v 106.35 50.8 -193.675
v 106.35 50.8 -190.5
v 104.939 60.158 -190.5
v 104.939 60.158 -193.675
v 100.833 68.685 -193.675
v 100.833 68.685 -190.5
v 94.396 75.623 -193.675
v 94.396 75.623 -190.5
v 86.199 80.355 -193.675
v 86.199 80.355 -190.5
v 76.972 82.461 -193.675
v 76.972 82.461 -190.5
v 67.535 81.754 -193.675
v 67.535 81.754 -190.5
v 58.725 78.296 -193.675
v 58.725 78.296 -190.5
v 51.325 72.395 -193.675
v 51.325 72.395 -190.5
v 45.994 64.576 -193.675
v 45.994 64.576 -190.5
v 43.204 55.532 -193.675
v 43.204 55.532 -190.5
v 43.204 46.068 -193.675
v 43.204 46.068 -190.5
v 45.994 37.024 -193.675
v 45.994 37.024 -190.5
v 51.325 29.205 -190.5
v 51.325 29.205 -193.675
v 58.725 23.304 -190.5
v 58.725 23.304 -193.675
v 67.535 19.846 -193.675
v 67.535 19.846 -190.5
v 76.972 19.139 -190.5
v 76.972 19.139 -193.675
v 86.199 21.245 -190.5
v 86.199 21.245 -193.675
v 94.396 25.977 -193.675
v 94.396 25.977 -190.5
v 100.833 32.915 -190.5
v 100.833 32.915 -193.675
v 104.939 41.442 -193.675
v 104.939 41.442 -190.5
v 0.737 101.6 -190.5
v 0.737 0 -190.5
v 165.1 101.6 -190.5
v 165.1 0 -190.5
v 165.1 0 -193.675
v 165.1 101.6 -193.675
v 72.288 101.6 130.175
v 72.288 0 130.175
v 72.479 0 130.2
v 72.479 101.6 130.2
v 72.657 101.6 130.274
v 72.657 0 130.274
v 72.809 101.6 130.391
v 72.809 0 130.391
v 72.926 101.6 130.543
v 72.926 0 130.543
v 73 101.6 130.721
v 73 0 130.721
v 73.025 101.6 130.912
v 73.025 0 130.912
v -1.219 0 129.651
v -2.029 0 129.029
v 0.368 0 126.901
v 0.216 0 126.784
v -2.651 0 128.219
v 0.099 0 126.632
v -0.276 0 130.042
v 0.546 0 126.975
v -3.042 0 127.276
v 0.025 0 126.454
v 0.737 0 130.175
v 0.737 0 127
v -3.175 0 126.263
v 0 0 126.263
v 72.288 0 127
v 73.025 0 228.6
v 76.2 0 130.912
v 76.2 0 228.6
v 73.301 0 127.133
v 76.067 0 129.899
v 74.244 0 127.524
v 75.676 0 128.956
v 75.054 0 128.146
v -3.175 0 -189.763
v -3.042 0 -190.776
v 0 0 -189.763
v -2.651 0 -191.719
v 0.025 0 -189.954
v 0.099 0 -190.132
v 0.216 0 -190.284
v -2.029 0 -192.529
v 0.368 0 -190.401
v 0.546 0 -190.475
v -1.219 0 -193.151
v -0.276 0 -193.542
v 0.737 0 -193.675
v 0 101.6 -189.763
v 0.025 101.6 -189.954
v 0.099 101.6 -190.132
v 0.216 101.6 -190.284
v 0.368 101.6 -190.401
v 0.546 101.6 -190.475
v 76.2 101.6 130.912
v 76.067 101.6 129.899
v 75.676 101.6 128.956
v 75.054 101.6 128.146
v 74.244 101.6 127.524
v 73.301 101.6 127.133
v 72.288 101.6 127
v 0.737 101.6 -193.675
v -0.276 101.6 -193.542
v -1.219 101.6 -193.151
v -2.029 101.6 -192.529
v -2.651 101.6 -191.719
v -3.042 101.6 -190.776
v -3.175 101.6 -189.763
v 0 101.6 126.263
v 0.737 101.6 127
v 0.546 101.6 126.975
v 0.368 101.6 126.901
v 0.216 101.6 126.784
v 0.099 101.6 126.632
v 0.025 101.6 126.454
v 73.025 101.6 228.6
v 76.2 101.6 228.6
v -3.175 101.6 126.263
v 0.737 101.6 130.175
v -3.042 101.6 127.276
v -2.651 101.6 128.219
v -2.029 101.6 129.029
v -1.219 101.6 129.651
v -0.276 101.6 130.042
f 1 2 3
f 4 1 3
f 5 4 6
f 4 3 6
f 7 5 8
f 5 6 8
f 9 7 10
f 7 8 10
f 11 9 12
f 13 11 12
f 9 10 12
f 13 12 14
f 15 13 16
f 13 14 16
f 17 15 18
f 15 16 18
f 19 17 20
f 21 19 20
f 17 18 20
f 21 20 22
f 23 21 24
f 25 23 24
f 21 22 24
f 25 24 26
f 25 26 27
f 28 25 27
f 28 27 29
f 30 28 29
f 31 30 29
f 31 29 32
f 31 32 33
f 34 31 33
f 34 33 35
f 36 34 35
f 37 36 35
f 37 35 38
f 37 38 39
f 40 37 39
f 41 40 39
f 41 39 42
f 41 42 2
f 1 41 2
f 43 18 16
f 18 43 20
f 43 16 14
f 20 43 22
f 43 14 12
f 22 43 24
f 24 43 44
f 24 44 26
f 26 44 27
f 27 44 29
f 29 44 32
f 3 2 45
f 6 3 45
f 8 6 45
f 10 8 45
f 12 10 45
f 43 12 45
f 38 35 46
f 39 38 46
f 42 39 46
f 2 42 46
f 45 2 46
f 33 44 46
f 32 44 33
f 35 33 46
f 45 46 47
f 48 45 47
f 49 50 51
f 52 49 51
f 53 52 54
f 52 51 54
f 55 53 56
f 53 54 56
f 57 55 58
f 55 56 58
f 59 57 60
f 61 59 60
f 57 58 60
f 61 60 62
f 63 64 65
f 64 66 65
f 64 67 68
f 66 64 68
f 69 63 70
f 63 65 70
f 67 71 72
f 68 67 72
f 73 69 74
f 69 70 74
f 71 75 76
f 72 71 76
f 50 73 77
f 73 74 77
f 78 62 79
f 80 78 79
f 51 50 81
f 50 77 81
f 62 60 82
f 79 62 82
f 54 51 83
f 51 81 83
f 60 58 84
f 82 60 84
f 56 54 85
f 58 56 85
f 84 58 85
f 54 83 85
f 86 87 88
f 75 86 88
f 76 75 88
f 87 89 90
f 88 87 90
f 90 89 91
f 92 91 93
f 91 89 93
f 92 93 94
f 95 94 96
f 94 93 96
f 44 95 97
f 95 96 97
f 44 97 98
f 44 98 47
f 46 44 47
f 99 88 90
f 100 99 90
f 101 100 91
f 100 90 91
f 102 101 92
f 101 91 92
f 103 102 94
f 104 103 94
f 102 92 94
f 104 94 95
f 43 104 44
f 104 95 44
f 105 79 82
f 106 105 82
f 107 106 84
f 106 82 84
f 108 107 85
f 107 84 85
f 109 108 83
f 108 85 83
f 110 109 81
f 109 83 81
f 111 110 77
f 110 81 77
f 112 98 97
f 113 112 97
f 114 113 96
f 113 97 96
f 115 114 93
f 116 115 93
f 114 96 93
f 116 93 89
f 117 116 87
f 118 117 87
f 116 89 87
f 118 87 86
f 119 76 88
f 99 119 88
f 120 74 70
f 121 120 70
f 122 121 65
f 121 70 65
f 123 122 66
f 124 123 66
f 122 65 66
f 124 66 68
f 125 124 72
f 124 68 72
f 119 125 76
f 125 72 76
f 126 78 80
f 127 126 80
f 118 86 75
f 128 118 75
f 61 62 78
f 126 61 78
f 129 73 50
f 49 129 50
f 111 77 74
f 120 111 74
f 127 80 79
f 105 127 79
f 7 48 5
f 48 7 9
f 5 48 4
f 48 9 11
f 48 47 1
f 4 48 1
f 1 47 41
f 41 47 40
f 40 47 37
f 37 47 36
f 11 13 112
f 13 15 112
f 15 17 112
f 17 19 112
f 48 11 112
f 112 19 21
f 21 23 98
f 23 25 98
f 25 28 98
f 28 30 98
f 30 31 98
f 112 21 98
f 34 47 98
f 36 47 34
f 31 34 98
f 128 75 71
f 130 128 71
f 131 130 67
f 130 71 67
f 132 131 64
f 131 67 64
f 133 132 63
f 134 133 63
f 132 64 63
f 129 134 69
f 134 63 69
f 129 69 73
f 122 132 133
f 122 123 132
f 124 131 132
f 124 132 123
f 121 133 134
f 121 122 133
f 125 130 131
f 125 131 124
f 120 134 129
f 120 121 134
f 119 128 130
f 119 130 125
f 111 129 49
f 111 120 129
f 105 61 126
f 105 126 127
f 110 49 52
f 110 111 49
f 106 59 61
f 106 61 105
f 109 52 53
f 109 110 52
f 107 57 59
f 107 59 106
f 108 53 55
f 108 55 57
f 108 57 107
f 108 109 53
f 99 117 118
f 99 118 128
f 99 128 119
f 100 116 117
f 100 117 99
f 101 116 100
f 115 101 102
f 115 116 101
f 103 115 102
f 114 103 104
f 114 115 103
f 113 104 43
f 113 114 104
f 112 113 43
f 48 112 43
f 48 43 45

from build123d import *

# Parameters (mm, degrees)
BASE_FLANGE1_DEPTH = 101.6
SKETCH6_R          = 31.75
CUT_EXTRUDE1_DEPTH = 462.763337653


# Sheet-metal steps are written as plain solids
with BuildPart() as part:
    # Sketch1 → Base-Flange1 (new body)
    with BuildSketch(Plane(origin=(0, 0, 0), x_dir=(1, 0, 0), z_dir=(0, 1, 0))):
        with BuildLine():
            Line((76.2, -228.6), (76.2, -130.9116))
            ThreePointArc((76.2, -130.9116), (75.054318885, -128.145681115), (72.2884, -127))
            Line((72.2884, -127), (0.7366, -127))
            ThreePointArc((0.7366, -127), (0.215745145, -126.784254855), (0, -126.2634))
            Line((0, -126.2634), (0, 0))
            Line((0, 0), (0, 189.7634))
            ThreePointArc((0, 189.7634), (0.215745145, 190.284254855), (0.7366, 190.5))
            Line((0.7366, 190.5), (165.1, 190.5))
            Line((165.1, 190.5), (165.1, 193.675))
            Line((165.1, 193.675), (0.7366, 193.675))
            ThreePointArc((0.7366, 193.675), (-2.029318885, 192.529318885), (-3.175, 189.7634))
            Line((-3.175, 189.7634), (-3.175, 0))
            Line((-3.175, 0), (-3.175, -126.2634))
            ThreePointArc((-3.175, -126.2634), (-2.029318885, -129.029318885), (0.7366, -130.175))
            Line((0.7366, -130.175), (72.2884, -130.175))
            ThreePointArc((72.2884, -130.175), (72.809254855, -130.390745145), (73.025, -130.9116))
            Line((73.025, -130.9116), (73.025, -228.6))
            Line((73.025, -228.6), (76.2, -228.6))
        make_face()
    extrude(amount=BASE_FLANGE1_DEPTH)

    # Sketch6 → Cut-Extrude1 (cut, through all)
    with BuildSketch(Plane.XY.offset(-190.5)):
        with Locations((74.5998, 50.8)):
            Circle(SKETCH6_R)
    extrude(amount=-CUT_EXTRUDE1_DEPTH, mode=Mode.SUBTRACT)


solid = part.part
